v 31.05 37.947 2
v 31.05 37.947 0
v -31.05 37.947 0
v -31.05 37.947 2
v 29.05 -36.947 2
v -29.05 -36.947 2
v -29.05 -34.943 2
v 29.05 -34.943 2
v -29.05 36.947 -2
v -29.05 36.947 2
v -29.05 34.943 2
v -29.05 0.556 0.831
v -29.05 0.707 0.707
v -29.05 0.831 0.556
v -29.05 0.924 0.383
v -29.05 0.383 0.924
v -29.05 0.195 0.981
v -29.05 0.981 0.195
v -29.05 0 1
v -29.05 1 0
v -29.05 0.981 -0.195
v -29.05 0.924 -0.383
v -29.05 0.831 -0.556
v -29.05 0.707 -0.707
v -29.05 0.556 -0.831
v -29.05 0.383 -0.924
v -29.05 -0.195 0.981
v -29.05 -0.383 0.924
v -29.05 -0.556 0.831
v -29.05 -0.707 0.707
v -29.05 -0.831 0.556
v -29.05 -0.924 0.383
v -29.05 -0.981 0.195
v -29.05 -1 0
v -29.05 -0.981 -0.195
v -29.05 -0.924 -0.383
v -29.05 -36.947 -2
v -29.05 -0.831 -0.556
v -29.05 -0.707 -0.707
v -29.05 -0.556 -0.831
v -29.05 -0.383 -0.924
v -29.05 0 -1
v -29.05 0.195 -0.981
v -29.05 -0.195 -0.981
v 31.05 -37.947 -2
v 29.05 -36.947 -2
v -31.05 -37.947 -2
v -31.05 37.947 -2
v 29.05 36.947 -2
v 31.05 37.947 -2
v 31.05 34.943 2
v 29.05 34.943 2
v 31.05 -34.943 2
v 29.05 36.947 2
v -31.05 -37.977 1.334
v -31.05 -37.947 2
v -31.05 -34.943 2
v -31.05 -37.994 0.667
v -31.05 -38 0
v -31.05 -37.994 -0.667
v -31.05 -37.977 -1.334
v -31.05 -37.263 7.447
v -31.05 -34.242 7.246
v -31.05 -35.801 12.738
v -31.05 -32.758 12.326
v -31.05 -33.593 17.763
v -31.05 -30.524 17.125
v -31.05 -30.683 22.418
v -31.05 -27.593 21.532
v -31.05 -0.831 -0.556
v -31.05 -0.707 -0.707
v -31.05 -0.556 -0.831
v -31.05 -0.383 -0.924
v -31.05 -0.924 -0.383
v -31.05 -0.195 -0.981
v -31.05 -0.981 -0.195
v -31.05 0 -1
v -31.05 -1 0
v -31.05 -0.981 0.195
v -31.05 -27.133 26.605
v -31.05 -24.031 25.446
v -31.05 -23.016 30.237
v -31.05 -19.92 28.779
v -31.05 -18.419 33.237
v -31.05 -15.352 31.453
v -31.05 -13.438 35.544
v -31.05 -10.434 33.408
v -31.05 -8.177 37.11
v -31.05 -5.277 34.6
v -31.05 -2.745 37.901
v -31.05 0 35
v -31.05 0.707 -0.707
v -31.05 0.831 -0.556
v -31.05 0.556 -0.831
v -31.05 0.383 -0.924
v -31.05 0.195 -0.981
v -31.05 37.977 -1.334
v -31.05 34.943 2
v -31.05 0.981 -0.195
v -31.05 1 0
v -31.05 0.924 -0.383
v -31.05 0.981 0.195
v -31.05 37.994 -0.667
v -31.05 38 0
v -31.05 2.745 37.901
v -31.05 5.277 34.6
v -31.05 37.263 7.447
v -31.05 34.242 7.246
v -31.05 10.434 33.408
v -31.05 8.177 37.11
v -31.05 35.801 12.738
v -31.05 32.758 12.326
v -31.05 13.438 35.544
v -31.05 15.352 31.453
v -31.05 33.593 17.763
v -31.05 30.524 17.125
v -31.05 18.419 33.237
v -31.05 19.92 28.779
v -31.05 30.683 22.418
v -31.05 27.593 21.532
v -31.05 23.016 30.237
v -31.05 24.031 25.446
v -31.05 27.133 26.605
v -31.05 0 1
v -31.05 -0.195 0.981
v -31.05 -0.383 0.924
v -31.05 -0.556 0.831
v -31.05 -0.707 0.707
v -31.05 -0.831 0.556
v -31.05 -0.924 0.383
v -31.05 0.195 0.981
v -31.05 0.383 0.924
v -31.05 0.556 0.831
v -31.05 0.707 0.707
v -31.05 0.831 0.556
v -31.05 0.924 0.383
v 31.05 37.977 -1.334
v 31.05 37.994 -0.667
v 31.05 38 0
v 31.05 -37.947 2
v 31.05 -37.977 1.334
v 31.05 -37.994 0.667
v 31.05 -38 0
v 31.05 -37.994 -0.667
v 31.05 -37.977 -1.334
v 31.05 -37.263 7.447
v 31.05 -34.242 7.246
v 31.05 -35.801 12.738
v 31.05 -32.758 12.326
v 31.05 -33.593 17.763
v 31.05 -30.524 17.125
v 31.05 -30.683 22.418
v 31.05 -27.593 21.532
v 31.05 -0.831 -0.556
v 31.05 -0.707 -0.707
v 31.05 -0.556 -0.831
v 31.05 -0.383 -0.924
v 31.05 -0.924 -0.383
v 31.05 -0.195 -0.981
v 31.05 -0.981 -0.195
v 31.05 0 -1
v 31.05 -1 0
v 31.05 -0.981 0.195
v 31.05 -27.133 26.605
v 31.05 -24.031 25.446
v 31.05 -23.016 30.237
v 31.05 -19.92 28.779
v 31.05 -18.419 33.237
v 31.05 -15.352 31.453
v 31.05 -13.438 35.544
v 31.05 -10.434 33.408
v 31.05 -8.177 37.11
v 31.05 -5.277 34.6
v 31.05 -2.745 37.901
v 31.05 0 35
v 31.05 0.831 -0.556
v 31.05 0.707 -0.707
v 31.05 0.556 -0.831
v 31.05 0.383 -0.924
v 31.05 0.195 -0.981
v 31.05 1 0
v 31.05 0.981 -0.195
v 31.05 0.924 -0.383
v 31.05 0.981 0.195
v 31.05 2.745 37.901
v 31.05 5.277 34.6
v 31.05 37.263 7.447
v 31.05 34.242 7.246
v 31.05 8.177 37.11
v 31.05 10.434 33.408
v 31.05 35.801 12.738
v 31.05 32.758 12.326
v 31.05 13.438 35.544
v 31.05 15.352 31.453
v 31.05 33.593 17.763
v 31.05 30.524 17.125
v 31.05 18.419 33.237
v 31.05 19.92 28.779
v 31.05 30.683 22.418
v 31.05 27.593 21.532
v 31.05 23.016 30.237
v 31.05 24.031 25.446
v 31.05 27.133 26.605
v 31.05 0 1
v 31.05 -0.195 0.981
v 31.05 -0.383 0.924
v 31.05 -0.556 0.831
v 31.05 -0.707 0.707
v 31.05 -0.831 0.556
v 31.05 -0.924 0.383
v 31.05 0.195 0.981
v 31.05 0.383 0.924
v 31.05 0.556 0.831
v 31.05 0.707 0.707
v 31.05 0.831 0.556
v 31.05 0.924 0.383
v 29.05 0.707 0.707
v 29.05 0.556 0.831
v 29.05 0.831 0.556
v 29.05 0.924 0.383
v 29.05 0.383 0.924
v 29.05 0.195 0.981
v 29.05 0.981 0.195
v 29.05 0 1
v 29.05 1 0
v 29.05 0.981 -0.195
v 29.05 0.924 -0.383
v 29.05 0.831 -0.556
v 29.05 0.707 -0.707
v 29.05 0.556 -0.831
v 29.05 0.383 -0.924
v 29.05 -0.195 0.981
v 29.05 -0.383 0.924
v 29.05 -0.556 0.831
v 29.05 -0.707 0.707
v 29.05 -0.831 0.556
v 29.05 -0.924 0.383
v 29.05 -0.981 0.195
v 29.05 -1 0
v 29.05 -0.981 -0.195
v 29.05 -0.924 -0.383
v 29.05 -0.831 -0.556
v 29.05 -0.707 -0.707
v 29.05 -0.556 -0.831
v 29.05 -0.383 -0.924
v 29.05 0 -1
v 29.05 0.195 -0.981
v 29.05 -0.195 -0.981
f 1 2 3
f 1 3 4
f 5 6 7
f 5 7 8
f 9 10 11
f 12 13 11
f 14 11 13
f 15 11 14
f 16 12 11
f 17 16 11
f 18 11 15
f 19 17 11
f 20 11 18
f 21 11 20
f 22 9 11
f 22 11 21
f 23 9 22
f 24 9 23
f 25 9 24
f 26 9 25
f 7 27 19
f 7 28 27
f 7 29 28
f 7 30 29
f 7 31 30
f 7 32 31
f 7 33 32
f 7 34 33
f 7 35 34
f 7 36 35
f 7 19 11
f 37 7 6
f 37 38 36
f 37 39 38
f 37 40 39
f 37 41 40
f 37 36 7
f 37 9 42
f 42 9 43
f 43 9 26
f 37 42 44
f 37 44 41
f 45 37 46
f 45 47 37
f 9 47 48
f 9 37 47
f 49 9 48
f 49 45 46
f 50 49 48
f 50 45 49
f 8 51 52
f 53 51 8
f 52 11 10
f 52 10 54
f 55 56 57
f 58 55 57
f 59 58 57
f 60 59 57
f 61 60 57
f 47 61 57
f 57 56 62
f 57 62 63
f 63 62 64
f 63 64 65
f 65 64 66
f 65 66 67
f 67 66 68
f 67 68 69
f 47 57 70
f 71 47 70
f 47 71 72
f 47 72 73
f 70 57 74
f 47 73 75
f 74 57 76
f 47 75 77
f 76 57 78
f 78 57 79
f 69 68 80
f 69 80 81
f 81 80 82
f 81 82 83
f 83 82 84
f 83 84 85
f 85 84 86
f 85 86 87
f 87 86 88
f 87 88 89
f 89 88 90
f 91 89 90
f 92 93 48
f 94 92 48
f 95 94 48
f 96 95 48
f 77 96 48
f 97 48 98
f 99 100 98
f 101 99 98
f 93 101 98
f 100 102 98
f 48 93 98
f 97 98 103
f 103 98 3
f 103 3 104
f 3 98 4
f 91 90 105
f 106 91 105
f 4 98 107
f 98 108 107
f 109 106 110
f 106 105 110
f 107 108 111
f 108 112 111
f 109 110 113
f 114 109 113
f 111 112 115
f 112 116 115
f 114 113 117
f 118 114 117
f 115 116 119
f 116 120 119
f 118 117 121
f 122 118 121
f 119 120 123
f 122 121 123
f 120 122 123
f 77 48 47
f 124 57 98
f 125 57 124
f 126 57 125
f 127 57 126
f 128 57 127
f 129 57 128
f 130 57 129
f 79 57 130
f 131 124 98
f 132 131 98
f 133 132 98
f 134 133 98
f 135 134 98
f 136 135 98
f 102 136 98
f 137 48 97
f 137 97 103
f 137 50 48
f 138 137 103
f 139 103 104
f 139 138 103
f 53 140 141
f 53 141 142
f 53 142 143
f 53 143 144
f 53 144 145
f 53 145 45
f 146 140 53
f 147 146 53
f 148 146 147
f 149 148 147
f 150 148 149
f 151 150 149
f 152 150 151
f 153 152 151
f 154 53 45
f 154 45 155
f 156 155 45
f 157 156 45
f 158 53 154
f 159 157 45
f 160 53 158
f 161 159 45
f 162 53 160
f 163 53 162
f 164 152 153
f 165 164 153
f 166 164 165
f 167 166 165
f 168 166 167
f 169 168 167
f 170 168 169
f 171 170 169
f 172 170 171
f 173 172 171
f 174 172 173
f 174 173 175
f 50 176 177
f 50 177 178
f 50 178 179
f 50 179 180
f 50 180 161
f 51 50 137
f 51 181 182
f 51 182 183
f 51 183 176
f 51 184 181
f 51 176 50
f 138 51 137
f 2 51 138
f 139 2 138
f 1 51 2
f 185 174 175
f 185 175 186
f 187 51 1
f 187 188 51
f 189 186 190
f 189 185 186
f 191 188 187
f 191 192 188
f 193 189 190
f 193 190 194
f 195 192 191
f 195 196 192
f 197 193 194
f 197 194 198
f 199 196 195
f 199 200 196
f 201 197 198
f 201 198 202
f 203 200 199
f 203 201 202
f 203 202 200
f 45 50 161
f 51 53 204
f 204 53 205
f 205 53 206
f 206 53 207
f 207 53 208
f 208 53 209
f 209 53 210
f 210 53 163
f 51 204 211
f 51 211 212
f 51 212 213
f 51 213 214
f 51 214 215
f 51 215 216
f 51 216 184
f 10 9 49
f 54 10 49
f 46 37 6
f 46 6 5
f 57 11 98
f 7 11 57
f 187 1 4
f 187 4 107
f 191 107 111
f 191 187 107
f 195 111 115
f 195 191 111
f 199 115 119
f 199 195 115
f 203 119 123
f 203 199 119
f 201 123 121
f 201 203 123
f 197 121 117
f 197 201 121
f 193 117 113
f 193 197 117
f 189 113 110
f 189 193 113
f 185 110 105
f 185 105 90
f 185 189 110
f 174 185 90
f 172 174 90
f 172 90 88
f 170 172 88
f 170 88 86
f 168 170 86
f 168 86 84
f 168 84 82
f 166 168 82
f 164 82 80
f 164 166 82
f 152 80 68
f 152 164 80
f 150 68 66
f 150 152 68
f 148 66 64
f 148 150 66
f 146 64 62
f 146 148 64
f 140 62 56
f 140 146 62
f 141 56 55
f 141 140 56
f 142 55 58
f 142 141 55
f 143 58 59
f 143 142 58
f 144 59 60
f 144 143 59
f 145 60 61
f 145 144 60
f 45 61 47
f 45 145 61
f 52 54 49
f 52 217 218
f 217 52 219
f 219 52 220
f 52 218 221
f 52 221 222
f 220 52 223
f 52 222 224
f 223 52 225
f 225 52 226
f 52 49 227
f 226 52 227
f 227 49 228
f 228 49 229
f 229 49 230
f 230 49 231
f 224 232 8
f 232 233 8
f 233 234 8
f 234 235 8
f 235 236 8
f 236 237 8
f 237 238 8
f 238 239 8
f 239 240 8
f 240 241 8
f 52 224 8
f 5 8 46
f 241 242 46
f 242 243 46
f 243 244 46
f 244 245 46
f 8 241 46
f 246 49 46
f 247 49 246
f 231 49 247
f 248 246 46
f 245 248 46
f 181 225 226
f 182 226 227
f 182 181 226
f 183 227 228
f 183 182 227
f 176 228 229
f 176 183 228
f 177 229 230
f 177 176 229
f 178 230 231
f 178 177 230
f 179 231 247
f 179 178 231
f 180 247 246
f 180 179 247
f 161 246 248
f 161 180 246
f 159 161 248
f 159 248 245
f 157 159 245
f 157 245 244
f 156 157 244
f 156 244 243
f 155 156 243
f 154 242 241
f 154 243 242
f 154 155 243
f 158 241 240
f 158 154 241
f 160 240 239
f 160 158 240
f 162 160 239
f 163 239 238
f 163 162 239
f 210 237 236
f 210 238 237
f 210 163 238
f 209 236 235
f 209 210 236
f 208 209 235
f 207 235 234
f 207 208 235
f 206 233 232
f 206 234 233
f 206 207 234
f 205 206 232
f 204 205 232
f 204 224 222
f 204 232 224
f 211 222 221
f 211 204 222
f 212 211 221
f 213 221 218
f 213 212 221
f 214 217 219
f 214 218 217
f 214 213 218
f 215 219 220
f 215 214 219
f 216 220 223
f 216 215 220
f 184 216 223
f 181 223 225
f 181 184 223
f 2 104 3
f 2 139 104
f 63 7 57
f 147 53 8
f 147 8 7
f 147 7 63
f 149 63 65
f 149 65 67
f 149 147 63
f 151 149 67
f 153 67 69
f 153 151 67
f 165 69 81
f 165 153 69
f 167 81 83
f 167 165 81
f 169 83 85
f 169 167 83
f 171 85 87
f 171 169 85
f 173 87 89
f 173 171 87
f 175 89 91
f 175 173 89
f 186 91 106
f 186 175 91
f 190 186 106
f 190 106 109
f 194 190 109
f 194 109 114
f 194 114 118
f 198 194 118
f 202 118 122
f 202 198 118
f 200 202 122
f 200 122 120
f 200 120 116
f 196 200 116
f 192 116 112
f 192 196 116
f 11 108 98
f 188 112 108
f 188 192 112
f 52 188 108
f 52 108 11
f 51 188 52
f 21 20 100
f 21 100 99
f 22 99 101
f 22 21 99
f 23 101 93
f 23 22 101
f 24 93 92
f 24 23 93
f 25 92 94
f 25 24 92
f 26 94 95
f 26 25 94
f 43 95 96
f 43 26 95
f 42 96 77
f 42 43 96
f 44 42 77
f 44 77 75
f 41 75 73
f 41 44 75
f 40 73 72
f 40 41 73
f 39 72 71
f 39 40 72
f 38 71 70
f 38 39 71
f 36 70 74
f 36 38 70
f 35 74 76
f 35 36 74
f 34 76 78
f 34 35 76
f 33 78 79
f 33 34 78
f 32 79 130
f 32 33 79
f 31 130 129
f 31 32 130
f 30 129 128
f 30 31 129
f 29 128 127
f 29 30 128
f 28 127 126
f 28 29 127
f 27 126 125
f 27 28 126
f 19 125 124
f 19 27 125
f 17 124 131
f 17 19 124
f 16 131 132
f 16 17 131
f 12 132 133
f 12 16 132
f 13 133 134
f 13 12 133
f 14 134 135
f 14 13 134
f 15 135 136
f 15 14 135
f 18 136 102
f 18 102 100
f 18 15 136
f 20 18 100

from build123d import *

# Parameters (mm, degrees)
F1_DEPTH = 31.05
F2_W     = 58.1
F2_H     = 73.894663844
F3_DEPTH = 4


with BuildPart() as f1:
    # F0 (on Right) → F1 (new body, symmetric)
    with BuildSketch(Plane.YZ):
        with BuildLine():
            ThreePointArc((-35, 0), (-34.9856996834, 1.0004087475), (-34.9428104193, 2))
            Line((-34.9428104193, 2), (-37.947331922, 2))
            ThreePointArc((-37.947331922, 2), (-37.9868306985, 1.0003466807), (-38, 0))
            Line((-38, 0), (-35, 0))
        make_face()
        with BuildLine():
            ThreePointArc((-34.9428104193, 2), (0, 35), (34.9428104193, 2))
            Line((34.9428104193, 2), (37.947331922, 2))
            ThreePointArc((37.947331922, 2), (0, 38), (-37.947331922, 2))
            Line((-37.947331922, 2), (-34.9428104193, 2))
        make_face()
        with BuildLine():
            Line((1, 0), (35, 0))
            ThreePointArc((35, 0), (34.9856996834, 1.0004087475), (34.9428104193, 2))
            Line((34.9428104193, 2), (-34.9428104193, 2))
            ThreePointArc((-34.9428104193, 2), (-34.9856996834, 1.0004087475), (-35, 0))
            Line((-35, 0), (-1, 0))
            ThreePointArc((-1, 0), (0, 1), (1, 0))
        make_face()
        with BuildLine():
            ThreePointArc((34.9428104193, -2), (34.9856996834, -1.0004087475), (35, 0))
            Line((35, 0), (1, 0))
            ThreePointArc((1, 0), (0, -1), (-1, 0))
            Line((-1, 0), (-35, 0))
            ThreePointArc((-35, 0), (-34.9856996834, -1.0004087475), (-34.9428104193, -2))
            Line((-34.9428104193, -2), (34.9428104193, -2))
        make_face()
        with BuildLine():
            Line((-37.947331922, -2), (-34.9428104193, -2))
            ThreePointArc((-34.9428104193, -2), (-34.9856996834, -1.0004087475), (-35, 0))
            Line((-35, 0), (-38, 0))
            ThreePointArc((-38, 0), (-37.9868306985, -1.0003466807), (-37.947331922, -2))
        make_face()
        with BuildLine():
            Line((37.947331922, 0), (35, 0))
            ThreePointArc((35, 0), (34.9856996834, -1.0004087475), (34.9428104193, -2))
            Line((34.9428104193, -2), (37.947331922, -2))
            ThreePointArc((37.947331922, -2), (37.9868306985, -1.0003466807), (38, 0))
            Line((38, 0), (37.947331922, 0))
        make_face()
        with BuildLine():
            ThreePointArc((34.9428104193, 2), (34.9856996834, 1.0004087475), (35, 0))
            Line((35, 0), (37.947331922, 0))
            Line((37.947331922, 0), (37.947331922, 2))
            Line((37.947331922, 2), (34.9428104193, 2))
        make_face()
    extrude(amount=F1_DEPTH, both=True)

    # F2 (on face) → F3 (cut, through all)
    with BuildSketch(Plane(origin=(0, 0, -2), x_dir=(1, 0, 0), z_dir=(0, 0, -1))):
        Rectangle(F2_W, F2_H)
    extrude(amount=-F3_DEPTH, mode=Mode.SUBTRACT)


solid = f1.part
